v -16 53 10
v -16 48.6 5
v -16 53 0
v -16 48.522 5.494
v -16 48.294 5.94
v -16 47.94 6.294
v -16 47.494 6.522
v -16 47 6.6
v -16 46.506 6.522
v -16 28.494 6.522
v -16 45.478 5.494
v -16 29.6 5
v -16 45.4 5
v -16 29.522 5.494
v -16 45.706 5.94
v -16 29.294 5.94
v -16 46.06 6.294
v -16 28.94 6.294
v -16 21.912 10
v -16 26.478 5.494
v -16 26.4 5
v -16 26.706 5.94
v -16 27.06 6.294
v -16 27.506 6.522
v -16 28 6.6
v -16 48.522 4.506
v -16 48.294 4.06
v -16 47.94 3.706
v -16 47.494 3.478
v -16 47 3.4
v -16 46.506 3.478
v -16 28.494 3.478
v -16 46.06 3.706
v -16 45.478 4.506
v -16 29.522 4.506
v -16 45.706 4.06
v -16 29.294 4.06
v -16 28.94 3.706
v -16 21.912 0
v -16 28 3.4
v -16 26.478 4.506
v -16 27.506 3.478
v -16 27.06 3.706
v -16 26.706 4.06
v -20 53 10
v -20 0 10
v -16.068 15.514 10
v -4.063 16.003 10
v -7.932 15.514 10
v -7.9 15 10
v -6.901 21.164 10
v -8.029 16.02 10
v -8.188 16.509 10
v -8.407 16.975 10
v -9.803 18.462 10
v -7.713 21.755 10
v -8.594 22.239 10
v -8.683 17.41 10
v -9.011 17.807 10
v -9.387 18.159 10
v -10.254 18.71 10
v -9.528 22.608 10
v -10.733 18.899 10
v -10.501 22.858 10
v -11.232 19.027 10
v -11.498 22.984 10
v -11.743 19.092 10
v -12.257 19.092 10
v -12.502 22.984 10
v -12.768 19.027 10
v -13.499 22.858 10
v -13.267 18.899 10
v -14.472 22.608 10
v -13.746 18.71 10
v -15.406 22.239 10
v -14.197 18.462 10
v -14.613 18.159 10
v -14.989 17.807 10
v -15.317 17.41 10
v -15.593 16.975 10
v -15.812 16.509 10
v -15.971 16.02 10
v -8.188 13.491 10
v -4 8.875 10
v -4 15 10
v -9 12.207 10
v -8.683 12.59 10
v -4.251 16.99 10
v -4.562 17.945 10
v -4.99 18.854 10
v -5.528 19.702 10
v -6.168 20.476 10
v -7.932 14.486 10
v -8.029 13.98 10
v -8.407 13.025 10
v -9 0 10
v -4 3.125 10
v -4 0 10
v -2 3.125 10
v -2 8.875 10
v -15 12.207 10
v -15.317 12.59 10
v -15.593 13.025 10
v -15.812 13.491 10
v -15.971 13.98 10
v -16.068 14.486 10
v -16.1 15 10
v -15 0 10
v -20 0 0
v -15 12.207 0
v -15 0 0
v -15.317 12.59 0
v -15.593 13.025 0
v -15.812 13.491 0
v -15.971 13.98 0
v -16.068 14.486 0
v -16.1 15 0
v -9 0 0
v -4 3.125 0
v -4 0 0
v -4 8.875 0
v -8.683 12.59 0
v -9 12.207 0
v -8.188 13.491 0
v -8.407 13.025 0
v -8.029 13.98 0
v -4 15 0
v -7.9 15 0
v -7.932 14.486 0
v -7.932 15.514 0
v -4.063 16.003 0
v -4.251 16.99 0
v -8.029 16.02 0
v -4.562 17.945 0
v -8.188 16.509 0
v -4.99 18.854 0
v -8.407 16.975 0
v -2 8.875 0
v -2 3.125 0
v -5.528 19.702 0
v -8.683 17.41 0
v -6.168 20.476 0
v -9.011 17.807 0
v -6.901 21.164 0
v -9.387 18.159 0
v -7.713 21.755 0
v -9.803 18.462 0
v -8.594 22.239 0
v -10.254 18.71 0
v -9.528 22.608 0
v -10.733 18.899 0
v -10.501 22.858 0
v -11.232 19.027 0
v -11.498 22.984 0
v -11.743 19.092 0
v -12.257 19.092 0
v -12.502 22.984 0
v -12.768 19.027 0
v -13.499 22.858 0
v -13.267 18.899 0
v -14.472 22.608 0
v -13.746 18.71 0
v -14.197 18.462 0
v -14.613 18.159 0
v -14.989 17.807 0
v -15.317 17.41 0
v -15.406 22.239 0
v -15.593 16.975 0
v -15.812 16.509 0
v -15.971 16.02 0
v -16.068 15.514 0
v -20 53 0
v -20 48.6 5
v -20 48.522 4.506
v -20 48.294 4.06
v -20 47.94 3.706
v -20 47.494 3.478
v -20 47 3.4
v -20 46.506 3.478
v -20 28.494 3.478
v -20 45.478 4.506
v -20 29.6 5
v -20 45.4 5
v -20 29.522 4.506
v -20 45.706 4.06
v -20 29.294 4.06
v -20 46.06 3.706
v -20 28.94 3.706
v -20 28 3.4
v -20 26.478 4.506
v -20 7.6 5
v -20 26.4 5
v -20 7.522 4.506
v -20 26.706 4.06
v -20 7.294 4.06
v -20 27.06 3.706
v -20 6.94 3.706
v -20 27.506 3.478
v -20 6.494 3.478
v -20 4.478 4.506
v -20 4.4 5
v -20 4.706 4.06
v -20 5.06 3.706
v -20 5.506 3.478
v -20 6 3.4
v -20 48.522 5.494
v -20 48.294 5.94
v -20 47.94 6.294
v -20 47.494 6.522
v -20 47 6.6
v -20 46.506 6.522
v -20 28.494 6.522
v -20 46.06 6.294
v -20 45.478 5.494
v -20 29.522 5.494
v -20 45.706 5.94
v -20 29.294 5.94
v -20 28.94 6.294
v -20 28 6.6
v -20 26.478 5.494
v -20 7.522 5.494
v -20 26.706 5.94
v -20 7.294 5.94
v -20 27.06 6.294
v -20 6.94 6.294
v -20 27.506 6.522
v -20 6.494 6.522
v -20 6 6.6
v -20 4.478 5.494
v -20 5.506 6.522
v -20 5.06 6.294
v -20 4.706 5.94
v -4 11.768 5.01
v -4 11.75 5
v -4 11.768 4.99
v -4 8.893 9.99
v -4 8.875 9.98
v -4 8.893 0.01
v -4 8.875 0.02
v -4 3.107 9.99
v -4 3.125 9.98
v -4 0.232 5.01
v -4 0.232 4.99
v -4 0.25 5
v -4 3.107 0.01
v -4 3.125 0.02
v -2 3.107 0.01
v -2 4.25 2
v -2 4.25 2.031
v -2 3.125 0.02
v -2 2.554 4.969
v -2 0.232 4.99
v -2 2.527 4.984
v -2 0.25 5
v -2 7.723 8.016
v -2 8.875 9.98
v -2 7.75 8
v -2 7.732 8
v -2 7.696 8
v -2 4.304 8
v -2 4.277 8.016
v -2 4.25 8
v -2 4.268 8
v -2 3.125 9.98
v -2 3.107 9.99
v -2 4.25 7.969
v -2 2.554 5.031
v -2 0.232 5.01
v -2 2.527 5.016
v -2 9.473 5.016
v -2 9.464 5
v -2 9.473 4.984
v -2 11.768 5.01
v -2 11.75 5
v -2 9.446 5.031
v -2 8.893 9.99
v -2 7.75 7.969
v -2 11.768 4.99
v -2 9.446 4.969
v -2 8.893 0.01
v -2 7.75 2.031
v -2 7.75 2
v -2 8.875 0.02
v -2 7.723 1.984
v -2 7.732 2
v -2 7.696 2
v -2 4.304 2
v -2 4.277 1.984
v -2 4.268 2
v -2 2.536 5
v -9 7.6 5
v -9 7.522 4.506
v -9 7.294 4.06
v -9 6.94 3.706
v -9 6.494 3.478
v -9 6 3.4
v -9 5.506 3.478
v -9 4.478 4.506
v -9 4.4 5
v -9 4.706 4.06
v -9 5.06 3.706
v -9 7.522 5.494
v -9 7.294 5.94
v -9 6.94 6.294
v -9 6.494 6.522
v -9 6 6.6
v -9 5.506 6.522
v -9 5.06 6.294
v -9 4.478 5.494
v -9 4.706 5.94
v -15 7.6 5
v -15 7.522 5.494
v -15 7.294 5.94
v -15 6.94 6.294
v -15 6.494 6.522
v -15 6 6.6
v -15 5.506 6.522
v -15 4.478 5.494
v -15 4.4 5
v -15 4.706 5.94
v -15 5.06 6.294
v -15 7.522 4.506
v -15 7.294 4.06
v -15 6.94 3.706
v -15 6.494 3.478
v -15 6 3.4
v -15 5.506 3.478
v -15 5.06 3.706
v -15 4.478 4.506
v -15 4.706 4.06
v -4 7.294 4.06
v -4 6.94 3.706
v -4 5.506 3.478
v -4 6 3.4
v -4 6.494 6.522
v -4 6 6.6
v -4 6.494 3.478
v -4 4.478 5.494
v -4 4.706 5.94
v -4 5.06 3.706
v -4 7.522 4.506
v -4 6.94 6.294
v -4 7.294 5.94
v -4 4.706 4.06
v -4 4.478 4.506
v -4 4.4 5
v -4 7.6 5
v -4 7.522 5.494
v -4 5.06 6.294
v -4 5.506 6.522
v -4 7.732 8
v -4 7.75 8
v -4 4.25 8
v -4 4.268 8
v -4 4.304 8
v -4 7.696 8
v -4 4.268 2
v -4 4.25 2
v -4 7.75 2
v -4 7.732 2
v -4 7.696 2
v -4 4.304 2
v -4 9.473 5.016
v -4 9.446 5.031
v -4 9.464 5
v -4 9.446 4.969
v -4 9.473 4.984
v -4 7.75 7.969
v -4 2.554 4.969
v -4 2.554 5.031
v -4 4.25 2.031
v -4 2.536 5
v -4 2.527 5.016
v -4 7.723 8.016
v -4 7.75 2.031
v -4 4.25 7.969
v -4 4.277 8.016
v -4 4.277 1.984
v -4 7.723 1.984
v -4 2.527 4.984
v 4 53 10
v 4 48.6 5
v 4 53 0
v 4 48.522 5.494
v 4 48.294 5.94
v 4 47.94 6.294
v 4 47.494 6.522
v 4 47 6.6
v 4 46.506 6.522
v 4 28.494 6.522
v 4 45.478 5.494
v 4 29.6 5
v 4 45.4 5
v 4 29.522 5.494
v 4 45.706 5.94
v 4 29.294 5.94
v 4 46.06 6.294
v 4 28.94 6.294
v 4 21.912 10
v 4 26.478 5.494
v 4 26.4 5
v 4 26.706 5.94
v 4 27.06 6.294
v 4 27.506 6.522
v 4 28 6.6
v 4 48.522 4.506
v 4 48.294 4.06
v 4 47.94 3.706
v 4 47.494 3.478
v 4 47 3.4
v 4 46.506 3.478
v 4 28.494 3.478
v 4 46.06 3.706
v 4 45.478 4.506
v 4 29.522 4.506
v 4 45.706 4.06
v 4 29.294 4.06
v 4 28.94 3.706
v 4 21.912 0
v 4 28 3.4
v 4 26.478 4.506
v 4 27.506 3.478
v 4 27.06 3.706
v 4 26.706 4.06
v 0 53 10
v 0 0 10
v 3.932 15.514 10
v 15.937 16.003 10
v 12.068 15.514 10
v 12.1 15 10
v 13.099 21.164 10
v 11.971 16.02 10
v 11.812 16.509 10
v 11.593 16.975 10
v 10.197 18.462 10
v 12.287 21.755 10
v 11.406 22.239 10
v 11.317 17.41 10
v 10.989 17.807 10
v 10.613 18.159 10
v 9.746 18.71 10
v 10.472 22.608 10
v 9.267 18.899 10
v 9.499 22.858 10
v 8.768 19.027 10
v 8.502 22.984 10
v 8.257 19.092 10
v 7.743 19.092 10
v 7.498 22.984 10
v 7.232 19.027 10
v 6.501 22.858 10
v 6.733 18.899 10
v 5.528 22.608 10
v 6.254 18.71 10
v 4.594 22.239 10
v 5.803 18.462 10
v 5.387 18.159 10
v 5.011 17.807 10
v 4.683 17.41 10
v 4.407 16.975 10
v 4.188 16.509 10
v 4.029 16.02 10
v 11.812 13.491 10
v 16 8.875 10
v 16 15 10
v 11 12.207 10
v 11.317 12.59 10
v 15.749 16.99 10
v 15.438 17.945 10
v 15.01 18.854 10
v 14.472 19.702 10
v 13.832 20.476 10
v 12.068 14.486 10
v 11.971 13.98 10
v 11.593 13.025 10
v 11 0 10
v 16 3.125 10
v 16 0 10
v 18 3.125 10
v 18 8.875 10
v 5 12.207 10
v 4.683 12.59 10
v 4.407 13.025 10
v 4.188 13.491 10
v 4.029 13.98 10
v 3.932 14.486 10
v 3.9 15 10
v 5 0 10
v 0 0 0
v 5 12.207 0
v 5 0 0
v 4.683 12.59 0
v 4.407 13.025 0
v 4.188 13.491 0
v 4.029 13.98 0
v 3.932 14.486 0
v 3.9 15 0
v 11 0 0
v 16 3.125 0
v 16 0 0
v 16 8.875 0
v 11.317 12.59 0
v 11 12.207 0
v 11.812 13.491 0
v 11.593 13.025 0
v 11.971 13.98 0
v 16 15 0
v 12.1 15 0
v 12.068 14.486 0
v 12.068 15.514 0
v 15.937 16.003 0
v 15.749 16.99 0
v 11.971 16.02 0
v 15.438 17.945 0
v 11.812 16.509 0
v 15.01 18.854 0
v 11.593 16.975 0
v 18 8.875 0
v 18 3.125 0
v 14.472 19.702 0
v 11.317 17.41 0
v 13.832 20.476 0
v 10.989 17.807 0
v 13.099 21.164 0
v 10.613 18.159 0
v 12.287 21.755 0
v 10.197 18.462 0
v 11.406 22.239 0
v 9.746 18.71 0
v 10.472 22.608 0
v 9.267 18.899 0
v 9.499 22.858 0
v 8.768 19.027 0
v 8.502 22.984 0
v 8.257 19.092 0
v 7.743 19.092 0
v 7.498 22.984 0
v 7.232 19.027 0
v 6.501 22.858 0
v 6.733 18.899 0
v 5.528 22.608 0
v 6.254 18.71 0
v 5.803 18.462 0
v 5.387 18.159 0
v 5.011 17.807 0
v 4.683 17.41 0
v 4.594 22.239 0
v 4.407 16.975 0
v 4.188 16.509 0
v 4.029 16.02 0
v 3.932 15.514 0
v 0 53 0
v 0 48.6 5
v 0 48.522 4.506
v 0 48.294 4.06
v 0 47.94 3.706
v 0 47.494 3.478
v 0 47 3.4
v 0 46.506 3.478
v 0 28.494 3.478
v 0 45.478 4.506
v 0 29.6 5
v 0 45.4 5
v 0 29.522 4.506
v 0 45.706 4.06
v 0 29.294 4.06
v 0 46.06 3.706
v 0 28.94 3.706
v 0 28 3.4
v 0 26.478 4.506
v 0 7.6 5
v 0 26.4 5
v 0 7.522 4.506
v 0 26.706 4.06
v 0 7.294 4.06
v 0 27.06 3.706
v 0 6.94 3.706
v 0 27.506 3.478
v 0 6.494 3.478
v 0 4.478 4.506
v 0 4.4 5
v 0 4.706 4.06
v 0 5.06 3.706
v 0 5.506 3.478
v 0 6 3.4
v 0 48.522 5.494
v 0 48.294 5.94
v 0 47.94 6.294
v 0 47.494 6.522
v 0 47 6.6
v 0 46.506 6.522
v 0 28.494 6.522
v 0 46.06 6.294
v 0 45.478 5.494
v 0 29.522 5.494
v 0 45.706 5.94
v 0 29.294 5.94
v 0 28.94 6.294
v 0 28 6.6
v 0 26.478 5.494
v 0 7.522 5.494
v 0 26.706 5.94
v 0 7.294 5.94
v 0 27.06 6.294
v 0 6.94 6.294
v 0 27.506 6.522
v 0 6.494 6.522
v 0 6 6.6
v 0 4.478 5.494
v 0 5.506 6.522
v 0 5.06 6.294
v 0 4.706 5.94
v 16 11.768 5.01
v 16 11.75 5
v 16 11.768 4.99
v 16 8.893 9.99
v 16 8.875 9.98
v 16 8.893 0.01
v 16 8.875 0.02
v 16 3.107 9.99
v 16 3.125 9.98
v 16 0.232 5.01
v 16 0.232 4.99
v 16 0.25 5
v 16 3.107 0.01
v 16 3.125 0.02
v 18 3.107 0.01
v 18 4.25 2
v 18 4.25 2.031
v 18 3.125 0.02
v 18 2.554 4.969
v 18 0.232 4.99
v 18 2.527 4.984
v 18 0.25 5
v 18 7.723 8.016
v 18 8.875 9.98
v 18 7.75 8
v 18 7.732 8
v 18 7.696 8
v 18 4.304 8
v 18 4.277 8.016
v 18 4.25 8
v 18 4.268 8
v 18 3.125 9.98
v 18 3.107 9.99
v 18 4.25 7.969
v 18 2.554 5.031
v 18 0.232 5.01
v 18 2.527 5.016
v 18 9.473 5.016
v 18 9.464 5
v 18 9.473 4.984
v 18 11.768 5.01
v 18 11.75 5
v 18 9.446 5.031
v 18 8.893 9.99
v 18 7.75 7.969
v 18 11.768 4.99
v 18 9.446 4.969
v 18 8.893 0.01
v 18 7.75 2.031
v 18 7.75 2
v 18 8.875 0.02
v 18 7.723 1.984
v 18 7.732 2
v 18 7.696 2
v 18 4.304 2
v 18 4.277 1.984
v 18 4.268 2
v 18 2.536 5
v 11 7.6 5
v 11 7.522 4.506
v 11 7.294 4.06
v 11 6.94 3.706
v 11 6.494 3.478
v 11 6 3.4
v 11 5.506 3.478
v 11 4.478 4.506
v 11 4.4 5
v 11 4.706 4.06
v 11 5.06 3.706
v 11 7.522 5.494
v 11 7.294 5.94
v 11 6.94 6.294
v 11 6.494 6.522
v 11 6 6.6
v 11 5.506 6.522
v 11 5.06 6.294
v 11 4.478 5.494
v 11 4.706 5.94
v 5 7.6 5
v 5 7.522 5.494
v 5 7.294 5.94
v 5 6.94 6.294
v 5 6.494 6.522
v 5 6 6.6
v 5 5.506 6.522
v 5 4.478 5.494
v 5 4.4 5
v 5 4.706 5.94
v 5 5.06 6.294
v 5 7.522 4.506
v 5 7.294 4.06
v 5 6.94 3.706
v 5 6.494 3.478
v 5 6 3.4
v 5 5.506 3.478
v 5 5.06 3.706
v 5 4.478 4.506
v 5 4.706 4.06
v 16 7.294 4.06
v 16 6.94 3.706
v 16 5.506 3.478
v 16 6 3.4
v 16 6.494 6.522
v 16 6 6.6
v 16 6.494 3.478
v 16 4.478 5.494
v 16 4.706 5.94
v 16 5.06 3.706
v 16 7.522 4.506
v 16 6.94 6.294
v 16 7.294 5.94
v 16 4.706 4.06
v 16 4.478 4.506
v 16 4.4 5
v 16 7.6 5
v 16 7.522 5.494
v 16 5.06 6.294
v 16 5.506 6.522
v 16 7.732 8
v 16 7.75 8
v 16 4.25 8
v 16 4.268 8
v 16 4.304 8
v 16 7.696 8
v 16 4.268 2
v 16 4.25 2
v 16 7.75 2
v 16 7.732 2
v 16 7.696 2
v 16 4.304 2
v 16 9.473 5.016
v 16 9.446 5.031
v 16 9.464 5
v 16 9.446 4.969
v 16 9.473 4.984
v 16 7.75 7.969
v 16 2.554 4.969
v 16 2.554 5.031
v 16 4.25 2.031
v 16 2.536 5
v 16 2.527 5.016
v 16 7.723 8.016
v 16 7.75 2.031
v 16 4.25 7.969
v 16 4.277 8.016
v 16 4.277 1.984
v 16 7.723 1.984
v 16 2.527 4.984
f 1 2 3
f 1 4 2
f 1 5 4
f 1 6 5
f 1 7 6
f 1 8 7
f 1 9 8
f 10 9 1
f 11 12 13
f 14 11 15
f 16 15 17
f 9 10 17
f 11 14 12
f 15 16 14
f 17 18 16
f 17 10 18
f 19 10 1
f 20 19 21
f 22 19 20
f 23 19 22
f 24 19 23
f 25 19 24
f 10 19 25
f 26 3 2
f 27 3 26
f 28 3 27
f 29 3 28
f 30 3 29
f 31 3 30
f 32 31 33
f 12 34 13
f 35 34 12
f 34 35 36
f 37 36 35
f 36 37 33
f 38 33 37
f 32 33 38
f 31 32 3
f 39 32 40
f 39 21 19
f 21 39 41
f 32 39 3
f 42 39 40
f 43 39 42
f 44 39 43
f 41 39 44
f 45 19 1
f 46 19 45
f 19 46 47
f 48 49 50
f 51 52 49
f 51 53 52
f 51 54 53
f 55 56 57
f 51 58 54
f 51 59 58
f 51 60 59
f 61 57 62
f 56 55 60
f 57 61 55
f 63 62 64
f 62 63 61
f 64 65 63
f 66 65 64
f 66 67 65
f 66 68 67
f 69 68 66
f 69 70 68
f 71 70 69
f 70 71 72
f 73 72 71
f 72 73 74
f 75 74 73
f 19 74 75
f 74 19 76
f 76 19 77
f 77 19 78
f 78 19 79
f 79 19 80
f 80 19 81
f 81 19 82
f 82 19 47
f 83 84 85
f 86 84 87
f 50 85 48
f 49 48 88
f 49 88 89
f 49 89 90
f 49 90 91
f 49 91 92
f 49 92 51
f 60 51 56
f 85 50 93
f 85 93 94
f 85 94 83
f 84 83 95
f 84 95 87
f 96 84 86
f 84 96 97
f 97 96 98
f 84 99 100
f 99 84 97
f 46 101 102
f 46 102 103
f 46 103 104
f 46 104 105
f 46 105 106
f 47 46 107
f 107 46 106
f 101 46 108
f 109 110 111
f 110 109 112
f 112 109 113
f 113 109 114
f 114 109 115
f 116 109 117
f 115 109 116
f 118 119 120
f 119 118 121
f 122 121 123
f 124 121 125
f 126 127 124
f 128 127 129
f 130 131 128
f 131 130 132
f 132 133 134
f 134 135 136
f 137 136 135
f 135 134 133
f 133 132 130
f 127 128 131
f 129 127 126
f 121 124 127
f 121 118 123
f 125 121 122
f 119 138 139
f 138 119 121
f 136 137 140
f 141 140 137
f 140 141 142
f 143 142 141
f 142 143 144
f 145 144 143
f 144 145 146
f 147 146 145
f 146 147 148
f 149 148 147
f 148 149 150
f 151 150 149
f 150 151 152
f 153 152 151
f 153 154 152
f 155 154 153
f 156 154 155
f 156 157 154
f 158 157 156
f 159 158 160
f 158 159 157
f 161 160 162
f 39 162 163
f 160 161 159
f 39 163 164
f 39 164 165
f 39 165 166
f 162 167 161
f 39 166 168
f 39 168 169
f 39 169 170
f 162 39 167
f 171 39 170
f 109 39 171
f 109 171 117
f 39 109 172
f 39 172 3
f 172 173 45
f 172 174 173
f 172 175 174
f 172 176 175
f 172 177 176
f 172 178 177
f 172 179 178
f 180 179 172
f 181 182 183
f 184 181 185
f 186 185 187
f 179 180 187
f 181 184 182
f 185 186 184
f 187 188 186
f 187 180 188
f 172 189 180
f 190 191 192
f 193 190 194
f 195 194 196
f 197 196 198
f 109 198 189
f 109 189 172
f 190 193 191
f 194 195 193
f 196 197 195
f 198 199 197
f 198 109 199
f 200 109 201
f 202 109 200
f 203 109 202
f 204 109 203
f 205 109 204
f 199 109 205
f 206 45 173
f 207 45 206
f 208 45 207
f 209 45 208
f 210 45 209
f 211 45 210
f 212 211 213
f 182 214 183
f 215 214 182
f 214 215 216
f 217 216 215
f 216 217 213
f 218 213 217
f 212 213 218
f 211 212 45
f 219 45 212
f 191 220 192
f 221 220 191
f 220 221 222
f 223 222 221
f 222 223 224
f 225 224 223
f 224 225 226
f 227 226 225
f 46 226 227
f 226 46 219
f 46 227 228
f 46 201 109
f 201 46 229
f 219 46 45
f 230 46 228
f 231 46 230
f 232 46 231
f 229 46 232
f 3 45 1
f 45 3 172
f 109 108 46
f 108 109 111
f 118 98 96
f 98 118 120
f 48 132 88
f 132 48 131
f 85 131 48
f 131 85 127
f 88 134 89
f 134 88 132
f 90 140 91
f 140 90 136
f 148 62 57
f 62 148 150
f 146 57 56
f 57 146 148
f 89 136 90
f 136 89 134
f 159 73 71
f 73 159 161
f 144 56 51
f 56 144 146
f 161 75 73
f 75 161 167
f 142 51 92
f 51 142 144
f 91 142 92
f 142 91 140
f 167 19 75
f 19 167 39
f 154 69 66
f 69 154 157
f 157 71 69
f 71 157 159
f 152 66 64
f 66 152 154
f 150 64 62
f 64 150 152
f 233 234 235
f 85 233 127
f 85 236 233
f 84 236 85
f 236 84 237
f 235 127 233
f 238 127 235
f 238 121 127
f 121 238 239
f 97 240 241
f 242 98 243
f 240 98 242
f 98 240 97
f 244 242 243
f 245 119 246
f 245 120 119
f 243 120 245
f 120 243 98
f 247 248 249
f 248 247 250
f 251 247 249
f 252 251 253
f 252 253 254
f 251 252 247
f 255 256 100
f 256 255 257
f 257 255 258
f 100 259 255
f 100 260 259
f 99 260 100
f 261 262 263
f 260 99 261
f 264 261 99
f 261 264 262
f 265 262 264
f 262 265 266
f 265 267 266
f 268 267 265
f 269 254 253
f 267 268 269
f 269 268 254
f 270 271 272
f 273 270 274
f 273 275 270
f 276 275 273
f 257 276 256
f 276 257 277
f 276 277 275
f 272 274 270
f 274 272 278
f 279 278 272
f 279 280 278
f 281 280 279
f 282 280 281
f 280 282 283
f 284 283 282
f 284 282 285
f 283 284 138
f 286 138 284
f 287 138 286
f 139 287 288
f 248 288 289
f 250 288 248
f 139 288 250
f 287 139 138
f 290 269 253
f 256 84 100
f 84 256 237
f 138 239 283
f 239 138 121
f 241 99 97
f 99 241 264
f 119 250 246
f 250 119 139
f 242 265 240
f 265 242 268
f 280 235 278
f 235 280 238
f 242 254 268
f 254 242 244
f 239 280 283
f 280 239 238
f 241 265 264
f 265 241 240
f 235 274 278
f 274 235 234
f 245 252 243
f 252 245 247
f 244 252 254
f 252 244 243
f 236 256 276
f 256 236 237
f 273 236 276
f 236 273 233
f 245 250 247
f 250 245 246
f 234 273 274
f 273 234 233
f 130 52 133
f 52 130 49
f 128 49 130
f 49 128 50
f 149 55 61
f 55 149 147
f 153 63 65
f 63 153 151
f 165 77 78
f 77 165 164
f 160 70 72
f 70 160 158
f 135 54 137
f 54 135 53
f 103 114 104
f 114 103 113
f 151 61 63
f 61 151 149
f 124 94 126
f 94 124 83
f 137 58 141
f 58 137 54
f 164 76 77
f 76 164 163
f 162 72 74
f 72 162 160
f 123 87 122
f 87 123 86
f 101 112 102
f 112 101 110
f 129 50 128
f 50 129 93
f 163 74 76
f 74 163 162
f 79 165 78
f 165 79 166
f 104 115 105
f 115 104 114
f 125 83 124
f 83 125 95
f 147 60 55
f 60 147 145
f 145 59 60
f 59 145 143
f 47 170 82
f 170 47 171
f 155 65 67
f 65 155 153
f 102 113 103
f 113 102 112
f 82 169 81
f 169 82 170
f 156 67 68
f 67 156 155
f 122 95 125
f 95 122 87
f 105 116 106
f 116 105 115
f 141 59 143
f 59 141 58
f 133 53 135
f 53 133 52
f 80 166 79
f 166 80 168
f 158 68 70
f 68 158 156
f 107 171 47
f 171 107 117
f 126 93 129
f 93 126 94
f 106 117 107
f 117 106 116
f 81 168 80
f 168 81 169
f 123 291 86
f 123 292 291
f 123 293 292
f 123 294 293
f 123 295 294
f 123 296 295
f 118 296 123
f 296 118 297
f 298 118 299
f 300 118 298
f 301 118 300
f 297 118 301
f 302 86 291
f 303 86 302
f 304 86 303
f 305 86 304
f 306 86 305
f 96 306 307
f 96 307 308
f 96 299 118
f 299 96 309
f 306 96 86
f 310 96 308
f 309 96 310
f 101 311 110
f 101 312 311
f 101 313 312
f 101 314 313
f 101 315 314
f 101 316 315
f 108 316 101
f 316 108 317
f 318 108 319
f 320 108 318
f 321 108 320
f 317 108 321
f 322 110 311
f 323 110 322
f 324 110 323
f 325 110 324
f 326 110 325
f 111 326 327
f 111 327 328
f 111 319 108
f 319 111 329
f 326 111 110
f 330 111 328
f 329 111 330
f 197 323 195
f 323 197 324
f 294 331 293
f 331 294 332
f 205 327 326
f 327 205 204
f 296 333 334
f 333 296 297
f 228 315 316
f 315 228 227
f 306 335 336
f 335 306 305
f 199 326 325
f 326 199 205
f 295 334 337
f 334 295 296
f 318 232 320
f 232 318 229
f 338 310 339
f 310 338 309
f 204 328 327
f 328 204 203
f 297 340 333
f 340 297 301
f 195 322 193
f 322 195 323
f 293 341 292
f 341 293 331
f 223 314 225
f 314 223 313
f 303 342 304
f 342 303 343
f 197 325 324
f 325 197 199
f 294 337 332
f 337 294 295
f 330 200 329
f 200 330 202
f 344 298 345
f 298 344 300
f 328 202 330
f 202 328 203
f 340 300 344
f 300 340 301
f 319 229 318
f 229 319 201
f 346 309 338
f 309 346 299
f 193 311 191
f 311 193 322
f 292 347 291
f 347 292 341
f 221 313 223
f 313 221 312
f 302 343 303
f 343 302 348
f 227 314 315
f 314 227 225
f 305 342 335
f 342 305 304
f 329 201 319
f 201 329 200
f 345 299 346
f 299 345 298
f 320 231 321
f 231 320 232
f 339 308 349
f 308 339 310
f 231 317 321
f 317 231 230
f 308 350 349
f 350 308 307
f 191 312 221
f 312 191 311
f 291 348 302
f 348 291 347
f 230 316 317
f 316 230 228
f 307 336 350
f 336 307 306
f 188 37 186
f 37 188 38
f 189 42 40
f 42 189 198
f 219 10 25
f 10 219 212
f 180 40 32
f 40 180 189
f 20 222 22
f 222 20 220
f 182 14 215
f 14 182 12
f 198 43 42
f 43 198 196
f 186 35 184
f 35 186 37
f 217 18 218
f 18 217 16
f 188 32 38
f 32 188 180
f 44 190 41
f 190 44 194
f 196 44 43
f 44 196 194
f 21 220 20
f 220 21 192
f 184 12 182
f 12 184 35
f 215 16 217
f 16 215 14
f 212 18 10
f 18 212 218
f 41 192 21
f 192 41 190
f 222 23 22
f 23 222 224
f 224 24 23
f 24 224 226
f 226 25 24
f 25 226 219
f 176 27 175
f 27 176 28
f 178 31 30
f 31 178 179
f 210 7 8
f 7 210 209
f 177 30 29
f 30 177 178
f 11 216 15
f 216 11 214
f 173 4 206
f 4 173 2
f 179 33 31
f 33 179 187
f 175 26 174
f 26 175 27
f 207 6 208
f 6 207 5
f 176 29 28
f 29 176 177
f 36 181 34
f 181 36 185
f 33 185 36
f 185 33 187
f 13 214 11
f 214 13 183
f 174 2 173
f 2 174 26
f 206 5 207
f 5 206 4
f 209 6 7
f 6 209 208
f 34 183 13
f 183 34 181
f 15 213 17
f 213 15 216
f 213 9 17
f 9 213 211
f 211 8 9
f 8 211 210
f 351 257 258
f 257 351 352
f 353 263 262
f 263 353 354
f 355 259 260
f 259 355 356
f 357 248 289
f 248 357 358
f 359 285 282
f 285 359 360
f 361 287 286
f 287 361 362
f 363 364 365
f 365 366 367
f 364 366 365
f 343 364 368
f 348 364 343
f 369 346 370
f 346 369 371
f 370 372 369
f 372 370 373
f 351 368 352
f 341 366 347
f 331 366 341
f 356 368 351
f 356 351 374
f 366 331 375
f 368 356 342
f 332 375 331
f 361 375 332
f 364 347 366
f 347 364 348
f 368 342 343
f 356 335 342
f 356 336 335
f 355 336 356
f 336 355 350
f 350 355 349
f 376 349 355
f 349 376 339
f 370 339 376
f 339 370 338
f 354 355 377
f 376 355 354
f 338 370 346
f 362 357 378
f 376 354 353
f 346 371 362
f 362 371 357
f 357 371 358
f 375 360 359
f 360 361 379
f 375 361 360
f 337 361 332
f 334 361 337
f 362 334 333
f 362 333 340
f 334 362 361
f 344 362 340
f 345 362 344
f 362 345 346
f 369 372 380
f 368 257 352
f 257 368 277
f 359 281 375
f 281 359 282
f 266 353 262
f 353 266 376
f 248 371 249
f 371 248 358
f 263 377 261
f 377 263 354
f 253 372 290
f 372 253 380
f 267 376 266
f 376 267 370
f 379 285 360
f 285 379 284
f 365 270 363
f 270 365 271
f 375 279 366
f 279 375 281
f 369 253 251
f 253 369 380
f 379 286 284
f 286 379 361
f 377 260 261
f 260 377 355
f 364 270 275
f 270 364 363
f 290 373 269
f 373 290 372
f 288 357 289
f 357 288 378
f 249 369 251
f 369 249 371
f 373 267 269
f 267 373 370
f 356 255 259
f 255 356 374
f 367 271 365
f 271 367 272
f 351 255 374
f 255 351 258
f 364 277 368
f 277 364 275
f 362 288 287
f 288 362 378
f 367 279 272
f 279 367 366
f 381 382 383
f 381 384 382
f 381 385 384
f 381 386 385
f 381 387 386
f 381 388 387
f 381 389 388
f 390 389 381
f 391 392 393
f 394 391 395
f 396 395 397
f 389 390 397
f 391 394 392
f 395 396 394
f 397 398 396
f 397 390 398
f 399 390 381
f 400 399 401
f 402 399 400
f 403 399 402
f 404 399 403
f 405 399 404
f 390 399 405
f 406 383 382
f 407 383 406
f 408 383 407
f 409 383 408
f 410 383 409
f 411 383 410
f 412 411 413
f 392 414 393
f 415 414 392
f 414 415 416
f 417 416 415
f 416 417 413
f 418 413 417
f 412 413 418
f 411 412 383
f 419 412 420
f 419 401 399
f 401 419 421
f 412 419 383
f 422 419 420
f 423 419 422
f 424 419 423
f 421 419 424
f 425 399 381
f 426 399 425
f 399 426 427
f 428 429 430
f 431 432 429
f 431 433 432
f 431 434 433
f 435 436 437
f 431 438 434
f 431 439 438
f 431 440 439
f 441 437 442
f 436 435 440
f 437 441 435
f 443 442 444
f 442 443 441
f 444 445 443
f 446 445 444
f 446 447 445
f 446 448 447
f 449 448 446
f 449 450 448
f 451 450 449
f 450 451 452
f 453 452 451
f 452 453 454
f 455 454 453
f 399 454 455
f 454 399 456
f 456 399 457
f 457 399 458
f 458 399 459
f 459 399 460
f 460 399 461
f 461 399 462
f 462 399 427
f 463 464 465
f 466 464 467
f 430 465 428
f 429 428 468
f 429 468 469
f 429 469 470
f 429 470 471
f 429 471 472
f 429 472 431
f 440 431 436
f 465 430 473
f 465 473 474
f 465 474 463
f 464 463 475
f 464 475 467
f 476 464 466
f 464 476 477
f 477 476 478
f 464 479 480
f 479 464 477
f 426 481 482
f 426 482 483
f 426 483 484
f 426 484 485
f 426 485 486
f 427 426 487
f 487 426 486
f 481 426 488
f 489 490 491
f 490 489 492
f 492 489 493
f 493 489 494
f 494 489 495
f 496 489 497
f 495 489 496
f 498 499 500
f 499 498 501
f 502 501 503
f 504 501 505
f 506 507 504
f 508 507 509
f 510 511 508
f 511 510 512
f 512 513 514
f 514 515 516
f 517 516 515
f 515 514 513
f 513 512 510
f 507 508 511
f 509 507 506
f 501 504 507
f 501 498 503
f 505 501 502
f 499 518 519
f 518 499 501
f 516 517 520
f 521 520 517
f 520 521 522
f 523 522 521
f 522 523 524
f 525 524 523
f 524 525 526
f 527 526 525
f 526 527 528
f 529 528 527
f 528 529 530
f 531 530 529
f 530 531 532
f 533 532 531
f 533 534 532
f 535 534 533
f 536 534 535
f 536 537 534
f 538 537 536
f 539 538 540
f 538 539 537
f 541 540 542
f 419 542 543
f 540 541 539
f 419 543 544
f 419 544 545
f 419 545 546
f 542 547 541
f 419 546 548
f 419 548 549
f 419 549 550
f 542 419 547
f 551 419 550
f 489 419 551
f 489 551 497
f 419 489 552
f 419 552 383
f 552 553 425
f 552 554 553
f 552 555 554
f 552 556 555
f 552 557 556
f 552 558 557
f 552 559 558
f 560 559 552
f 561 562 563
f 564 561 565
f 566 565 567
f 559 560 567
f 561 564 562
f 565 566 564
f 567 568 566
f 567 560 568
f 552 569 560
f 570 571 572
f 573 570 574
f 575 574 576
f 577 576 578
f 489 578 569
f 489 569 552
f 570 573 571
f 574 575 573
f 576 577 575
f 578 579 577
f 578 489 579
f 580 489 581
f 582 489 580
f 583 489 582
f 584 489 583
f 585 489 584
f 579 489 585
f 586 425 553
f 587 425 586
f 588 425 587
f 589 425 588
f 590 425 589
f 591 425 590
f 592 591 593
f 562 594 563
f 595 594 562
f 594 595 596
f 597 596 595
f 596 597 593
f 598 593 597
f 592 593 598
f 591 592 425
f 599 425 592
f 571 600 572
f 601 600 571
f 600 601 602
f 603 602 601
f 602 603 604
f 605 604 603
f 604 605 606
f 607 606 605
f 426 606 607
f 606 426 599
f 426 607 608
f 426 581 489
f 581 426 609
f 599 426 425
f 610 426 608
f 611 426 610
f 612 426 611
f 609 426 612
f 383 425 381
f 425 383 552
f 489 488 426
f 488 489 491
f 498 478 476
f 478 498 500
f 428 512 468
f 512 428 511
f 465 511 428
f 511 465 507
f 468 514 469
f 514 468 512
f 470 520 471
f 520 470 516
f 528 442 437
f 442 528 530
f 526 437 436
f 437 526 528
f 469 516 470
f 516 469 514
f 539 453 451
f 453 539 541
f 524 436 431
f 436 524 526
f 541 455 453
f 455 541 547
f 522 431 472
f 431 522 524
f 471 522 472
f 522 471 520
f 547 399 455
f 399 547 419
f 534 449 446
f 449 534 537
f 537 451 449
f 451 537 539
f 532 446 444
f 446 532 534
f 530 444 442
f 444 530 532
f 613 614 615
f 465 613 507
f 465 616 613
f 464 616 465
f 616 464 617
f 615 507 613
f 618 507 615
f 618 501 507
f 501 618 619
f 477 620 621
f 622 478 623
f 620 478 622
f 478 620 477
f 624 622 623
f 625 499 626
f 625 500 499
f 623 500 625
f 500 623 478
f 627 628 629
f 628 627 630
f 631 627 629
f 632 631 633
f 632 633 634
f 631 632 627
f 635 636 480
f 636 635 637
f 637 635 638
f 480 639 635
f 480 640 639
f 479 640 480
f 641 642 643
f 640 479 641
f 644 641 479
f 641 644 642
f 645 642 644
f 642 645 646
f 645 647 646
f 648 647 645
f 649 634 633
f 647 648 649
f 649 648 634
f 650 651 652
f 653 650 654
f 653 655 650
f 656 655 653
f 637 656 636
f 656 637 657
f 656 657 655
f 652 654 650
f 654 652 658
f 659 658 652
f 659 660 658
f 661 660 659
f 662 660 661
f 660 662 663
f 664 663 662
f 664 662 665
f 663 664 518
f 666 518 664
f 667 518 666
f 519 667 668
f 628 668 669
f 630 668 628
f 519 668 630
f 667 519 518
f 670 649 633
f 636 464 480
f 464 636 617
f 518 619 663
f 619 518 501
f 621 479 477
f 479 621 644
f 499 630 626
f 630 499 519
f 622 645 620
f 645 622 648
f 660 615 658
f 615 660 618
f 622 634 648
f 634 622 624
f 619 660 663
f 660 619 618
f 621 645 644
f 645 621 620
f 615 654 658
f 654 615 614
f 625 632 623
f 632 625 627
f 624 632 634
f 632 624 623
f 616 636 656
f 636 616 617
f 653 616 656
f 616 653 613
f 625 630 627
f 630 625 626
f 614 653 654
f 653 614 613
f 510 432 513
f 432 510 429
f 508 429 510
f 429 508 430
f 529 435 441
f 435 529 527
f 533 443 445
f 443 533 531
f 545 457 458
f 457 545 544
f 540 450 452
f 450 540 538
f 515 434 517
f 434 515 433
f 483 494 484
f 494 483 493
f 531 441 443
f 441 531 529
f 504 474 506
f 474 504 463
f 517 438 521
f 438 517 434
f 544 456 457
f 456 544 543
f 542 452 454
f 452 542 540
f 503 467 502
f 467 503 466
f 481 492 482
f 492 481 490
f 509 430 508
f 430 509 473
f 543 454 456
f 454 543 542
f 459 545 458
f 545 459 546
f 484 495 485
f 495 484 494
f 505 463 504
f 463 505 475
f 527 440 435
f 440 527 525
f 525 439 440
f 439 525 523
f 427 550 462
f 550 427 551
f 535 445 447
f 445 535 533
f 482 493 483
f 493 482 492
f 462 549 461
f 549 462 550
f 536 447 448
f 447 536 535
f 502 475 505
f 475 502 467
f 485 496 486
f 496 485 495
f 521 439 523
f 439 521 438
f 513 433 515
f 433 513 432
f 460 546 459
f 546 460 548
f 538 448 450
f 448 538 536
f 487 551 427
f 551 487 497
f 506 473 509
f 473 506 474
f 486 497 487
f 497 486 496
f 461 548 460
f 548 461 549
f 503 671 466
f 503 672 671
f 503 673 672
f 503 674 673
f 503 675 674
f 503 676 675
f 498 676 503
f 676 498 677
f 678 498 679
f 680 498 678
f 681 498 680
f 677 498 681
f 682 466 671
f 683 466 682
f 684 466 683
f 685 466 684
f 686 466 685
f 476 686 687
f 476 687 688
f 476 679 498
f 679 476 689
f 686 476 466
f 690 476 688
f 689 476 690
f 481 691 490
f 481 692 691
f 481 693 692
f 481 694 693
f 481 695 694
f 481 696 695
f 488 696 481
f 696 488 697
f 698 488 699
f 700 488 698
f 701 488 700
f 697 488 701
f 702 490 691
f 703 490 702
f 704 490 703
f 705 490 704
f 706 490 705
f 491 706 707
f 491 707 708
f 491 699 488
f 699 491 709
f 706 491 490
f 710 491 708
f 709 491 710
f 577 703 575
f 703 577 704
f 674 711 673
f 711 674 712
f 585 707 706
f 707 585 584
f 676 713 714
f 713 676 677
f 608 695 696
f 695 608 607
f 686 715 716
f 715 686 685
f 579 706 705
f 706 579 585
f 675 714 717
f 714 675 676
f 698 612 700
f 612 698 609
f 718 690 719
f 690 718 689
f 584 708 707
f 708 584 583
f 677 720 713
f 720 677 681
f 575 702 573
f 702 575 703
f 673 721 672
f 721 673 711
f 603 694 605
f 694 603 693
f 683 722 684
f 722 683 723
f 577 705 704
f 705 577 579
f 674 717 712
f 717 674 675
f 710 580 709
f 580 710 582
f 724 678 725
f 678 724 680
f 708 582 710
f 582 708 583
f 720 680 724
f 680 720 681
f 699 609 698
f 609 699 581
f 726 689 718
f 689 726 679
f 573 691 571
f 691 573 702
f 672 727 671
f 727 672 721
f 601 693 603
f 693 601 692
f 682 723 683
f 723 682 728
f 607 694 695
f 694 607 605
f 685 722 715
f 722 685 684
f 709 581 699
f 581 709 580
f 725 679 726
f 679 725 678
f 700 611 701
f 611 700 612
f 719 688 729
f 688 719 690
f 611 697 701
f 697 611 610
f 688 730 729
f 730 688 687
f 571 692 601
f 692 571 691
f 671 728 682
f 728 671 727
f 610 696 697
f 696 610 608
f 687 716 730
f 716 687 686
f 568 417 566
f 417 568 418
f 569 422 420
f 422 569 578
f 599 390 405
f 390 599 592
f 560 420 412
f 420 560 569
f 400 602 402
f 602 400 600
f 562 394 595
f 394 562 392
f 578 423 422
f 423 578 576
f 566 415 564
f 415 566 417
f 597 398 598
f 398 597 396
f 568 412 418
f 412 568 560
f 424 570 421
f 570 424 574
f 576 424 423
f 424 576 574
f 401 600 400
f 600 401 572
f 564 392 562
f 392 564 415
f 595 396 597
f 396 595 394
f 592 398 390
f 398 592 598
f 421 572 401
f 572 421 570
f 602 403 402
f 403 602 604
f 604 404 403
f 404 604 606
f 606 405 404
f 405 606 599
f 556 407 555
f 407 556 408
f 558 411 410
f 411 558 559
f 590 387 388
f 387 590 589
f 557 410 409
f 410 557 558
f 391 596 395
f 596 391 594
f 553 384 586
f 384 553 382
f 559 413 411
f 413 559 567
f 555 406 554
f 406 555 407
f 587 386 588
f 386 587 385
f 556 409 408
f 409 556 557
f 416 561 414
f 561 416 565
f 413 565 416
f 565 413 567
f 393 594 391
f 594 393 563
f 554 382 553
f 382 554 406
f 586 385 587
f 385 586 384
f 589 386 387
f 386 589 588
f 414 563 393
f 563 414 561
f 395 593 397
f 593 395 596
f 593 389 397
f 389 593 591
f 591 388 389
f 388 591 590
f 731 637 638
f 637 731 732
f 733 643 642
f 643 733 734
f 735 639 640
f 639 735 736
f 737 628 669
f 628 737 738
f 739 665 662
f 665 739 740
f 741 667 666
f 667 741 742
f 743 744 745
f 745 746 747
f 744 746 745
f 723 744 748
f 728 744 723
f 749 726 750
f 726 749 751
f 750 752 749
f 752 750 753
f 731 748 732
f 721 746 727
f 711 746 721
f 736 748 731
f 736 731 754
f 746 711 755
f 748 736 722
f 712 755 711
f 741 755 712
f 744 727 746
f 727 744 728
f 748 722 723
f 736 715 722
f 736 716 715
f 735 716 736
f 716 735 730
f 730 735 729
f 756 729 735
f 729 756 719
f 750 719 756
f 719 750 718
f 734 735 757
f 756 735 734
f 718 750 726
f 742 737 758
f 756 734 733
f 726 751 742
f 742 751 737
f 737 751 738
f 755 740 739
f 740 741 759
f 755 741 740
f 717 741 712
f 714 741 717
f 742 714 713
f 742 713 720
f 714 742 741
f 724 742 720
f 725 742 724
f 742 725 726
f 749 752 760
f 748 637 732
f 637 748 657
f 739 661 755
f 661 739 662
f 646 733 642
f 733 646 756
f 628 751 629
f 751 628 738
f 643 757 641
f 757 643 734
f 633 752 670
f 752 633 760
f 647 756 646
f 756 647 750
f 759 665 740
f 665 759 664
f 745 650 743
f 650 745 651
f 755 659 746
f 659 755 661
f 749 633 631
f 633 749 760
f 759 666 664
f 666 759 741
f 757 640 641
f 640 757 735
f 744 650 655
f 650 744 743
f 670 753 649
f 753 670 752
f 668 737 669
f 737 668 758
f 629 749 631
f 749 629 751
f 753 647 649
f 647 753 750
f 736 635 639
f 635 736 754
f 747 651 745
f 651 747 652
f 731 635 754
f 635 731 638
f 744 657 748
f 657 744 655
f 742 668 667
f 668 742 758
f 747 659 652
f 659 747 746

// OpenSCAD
//    from http://www.thingiverse.com/thing:30085/#files
//    License CC-BY-SA
//    Heavily modified to look nice in OpenSCAD preview and for
//    dimensions of original Mendelmax endstop.

module endstop ()
{
    difference() {
	union() {
            cube([4, 53, 10]);  //4, 45, 10
            translate([8, 15, 0]) cylinder(h = 10, r = 8, $fn = 50);
            cube([16, 15, 10]);
            
            translate([17, 6, 5])
                cube([2, 5.75, 10], center = true);
            translate([17, 6, 5]) rotate([60, 0, 0])
                cube([2, 5.75, 10], center = true);
            translate([17, 6, 5]) rotate([120, 0, 0])
                cube([2, 5.75, 10], center = true);
	}
	translate([8, 15, 0])
            cylinder(h = 22, r = 4.1, center = true, $fn = 50);
	translate([5, -1, -1]) cube([6, 16, 12]);
	translate([-10, 6, 5]) rotate([0, 90, 0])
            cylinder(h = 30, r = 1.6, $fn= 20);
	translate([-10, 28, 5]) rotate([0, 90, 0])
            cylinder(h = 30, r = 1.6, $fn= 20);
	translate([-10, 28 + 19, 5]) rotate([0, 90, 0])
            cylinder(h = 30, r = 1.6, $fn= 20);
	translate([17.1, 6, 5])
            cube([2.2, 3.5, 6], center = true);
	translate([17.1, 6, 5]) rotate (a = [60, 0, 0])
            cube([2.2, 3.5, 6], center = true);
	translate([17.1, 6, 5]) rotate (a = [120, 0, 0])
            cube([2.2, 3.5, 6], center = true);
    }
}

translate ([-20, 0, 0]) endstop ();
translate ([  0, 0, 0]) endstop ();
